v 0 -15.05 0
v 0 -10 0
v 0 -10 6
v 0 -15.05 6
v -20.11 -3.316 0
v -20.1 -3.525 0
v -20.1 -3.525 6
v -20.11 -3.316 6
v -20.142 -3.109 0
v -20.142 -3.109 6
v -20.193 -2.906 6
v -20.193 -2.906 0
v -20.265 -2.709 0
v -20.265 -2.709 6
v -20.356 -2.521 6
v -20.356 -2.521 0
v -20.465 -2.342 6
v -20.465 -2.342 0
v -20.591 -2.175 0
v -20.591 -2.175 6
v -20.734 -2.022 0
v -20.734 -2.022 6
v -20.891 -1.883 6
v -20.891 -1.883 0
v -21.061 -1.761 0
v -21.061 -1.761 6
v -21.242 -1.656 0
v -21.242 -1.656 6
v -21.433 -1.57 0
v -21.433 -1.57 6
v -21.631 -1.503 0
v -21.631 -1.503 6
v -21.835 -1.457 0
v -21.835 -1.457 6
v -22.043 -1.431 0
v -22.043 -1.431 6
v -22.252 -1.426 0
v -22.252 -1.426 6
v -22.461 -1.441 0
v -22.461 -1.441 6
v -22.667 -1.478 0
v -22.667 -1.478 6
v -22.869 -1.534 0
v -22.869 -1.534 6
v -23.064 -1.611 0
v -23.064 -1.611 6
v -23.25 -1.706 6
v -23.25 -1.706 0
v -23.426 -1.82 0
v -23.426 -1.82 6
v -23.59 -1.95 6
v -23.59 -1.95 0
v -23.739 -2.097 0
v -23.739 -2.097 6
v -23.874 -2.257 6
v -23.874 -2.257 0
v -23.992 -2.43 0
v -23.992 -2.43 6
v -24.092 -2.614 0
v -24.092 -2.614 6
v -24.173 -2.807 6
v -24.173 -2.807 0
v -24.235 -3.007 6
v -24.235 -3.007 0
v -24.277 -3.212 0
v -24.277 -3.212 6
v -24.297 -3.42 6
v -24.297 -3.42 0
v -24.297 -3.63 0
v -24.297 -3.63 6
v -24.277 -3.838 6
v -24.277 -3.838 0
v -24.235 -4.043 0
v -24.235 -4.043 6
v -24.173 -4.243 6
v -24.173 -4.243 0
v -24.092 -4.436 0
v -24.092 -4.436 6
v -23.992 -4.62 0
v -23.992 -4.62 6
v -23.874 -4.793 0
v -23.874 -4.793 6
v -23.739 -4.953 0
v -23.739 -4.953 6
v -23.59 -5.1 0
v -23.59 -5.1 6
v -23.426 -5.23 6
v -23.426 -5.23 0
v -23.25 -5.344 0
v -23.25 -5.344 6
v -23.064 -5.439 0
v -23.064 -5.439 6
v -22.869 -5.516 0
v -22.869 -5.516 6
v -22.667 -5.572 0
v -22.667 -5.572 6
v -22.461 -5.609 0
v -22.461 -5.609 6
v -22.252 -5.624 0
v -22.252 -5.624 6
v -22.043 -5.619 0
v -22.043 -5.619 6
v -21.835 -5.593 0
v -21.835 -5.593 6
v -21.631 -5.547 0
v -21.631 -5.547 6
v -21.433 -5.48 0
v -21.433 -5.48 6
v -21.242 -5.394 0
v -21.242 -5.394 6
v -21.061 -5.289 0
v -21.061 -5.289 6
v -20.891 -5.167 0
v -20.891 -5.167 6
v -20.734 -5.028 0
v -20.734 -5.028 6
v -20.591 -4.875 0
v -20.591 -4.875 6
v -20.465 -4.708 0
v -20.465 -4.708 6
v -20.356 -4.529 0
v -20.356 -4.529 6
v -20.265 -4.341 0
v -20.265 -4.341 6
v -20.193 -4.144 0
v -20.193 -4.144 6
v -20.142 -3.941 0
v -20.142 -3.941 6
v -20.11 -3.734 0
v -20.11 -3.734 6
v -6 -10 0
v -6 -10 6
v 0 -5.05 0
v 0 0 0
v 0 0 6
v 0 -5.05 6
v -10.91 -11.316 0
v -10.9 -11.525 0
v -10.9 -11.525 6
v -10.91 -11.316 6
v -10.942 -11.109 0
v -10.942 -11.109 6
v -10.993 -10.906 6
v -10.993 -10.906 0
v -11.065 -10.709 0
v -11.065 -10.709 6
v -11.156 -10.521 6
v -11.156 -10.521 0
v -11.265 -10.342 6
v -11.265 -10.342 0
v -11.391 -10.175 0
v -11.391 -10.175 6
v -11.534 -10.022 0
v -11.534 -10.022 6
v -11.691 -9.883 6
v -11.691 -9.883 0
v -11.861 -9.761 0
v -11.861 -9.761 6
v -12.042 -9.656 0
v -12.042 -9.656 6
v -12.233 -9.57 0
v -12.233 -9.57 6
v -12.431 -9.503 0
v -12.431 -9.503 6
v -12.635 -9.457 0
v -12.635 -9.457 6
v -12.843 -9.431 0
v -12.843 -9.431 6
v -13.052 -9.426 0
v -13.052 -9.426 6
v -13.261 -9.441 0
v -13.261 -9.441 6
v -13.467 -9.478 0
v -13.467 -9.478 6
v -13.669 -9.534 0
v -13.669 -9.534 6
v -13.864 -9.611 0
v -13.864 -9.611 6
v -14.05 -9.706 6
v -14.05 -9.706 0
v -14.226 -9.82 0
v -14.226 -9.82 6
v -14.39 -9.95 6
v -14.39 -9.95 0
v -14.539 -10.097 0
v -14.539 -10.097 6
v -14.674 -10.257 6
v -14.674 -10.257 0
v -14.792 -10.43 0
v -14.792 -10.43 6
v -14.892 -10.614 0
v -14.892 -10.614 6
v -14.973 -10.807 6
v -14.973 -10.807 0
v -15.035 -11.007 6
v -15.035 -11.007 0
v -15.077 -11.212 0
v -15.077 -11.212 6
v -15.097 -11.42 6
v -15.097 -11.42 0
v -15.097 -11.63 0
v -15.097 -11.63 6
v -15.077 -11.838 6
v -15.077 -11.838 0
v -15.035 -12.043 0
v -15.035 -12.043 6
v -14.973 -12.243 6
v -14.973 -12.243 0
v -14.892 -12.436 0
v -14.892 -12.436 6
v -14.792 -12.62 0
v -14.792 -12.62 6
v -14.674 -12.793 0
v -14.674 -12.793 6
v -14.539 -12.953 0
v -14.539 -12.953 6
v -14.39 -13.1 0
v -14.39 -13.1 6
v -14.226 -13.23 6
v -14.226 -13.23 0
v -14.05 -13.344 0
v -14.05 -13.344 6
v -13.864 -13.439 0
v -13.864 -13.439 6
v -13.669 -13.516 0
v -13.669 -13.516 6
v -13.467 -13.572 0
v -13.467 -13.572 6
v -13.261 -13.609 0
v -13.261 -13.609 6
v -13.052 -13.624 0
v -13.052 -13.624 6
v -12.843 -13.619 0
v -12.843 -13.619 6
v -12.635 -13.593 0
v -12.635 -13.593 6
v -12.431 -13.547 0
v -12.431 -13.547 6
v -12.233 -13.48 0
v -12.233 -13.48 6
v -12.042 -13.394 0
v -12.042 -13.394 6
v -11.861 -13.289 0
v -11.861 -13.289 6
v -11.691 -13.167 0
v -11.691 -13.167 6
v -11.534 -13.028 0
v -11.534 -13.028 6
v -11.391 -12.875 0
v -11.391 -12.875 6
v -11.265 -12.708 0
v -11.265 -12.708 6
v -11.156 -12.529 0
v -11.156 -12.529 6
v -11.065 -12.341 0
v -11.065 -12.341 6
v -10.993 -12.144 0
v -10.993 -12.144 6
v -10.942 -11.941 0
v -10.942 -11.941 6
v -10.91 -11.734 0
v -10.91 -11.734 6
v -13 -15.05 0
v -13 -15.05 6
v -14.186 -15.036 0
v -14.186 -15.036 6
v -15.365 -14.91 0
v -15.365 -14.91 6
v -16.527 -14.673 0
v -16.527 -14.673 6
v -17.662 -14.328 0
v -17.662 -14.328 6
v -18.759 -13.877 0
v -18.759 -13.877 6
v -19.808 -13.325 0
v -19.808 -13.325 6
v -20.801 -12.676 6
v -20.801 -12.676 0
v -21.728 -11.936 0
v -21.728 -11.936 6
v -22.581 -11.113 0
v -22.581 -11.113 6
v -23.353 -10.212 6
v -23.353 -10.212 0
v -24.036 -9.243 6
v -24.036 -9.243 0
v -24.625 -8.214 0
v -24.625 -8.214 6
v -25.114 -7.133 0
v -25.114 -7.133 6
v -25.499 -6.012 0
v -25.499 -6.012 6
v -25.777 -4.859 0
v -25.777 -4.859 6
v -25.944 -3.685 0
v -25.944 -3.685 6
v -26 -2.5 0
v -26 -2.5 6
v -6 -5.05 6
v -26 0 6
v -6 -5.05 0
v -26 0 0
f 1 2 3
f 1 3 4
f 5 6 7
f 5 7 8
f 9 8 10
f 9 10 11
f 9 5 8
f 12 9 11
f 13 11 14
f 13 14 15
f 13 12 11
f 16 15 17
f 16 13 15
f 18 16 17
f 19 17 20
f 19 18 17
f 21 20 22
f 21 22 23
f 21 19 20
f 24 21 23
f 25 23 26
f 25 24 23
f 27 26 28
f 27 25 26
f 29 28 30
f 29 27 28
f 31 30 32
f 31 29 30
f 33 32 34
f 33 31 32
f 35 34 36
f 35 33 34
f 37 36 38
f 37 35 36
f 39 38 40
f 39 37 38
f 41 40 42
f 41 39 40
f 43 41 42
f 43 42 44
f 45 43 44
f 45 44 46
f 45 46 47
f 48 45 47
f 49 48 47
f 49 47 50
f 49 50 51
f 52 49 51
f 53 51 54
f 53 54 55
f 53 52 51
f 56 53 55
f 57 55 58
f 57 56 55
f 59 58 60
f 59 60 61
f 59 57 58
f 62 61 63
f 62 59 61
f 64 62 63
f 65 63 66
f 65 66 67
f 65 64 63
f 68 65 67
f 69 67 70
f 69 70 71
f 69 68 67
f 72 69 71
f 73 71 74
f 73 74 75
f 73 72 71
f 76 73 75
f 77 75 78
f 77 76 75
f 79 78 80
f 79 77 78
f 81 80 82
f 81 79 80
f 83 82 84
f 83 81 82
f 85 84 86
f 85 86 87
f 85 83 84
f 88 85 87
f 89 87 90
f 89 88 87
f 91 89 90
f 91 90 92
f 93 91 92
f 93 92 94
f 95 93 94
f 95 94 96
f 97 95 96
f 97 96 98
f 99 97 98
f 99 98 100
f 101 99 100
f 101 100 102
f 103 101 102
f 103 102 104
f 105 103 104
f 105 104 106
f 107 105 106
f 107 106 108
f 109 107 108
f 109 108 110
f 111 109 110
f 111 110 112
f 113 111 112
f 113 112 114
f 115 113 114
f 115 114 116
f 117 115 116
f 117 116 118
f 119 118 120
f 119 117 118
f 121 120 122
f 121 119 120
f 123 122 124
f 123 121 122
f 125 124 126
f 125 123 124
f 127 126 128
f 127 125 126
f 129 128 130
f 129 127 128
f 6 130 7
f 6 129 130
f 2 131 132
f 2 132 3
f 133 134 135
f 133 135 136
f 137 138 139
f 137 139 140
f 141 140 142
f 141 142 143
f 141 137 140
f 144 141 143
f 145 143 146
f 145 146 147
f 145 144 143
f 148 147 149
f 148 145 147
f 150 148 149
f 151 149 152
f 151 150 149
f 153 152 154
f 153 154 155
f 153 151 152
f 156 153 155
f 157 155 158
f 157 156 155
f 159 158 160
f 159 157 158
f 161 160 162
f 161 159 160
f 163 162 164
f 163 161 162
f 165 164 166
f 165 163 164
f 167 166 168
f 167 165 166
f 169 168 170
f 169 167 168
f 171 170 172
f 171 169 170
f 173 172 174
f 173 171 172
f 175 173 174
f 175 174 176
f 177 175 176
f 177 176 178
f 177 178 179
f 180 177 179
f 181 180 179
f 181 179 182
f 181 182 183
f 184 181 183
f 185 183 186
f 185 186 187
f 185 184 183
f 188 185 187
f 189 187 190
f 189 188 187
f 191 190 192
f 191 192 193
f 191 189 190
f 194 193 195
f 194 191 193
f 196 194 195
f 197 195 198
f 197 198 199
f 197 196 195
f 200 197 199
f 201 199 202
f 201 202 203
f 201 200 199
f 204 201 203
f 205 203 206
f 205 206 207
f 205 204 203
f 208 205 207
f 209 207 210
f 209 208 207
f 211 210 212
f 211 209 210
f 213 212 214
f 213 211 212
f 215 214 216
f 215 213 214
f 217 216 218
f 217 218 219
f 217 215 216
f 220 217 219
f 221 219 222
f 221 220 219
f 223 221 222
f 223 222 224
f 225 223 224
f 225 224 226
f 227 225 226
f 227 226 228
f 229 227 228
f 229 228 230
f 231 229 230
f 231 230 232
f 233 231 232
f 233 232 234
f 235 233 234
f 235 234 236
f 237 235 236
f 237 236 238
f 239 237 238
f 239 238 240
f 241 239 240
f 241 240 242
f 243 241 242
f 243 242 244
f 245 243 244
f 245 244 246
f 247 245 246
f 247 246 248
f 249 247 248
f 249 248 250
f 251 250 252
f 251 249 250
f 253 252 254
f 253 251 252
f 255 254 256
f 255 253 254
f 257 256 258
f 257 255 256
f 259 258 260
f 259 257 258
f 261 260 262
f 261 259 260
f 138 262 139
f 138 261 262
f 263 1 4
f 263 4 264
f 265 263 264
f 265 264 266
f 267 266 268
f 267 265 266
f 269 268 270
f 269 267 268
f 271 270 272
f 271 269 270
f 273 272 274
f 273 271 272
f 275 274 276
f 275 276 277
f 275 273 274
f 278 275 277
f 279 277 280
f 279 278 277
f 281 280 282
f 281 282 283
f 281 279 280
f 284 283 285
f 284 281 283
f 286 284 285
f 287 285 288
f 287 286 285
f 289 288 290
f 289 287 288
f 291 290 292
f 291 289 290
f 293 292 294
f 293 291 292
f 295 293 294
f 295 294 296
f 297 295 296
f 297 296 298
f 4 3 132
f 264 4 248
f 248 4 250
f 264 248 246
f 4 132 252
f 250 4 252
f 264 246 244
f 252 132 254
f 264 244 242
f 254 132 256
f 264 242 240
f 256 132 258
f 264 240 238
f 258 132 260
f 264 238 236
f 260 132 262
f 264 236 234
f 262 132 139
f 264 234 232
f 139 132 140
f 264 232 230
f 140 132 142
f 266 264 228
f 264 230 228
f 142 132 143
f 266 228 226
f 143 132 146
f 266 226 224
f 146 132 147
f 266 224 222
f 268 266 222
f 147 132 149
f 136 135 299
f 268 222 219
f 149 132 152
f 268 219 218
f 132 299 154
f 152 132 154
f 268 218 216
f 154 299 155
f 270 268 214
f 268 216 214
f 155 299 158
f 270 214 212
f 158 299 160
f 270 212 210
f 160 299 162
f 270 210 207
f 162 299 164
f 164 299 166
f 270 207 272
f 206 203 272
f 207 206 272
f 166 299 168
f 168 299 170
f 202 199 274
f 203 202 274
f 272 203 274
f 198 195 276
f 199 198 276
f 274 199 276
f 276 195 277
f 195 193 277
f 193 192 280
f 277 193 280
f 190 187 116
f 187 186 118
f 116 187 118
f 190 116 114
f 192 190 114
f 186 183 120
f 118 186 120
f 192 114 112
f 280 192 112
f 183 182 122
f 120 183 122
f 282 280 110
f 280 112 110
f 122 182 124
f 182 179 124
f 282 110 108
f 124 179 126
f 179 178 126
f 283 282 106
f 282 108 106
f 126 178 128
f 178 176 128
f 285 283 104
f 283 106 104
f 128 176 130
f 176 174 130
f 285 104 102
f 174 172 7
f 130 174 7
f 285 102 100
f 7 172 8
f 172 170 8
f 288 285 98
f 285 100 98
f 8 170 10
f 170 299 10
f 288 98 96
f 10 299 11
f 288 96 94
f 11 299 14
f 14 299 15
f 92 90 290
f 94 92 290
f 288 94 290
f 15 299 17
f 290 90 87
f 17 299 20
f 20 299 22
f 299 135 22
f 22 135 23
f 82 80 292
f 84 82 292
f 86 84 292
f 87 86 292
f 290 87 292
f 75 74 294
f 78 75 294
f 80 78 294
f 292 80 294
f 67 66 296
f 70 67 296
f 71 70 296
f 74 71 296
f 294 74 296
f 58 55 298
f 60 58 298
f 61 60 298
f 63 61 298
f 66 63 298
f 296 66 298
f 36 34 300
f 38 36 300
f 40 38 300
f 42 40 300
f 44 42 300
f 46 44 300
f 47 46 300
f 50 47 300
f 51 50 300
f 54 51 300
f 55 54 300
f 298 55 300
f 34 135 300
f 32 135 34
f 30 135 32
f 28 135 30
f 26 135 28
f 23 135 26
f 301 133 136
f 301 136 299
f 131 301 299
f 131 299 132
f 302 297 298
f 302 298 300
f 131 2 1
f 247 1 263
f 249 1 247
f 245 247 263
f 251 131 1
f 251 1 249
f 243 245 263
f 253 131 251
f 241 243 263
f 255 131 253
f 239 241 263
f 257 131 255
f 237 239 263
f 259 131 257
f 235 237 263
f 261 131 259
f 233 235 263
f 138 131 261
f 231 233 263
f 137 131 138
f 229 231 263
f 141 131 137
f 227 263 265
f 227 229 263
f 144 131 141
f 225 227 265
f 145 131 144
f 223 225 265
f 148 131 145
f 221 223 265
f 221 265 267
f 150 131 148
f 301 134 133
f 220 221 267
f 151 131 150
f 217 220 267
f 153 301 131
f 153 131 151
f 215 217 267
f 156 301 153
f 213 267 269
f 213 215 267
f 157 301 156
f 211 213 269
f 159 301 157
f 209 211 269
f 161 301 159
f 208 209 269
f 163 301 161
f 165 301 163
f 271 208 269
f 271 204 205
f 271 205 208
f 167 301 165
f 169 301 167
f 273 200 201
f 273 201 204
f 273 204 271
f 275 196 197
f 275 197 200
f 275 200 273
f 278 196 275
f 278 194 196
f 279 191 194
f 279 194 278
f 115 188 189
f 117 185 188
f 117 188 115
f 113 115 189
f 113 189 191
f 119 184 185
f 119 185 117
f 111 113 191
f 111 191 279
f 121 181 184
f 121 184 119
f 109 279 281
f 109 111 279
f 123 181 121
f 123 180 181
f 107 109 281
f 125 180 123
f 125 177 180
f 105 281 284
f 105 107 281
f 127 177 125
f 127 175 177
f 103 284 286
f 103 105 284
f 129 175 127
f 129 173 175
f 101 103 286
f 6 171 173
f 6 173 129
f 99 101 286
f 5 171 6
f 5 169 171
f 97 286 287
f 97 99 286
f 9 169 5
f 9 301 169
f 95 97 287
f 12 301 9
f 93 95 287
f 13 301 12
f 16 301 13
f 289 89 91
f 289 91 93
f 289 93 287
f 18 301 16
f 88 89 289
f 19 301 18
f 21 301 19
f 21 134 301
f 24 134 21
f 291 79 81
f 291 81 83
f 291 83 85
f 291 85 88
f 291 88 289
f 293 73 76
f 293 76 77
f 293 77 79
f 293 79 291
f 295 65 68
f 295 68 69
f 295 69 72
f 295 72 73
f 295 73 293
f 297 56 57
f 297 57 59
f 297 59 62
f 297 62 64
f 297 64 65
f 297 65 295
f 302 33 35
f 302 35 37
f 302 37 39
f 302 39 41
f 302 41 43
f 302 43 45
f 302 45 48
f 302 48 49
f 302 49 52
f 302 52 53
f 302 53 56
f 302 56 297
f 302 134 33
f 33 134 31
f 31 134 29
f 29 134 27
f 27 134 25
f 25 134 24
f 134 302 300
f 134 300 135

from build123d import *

# Parameters (mm, degrees)
ESQUISSE1_R        = 2.1
BOSS_EXTRU_1_DEPTH = 6


with BuildPart() as part:
    # Esquisse1 → Boss.-Extru.1 (new body)
    with BuildSketch(Plane.XY):
        with BuildLine():
            Line((0, 0), (0, -5.05))
            Line((0, -5.05), (-6, -5.05))
            Line((-6, -5.05), (-6, -10))
            Line((-6, -10), (0, -10))
            Line((0, -10), (0, -15.05))
            Line((0, -15.05), (-13, -15.05))
            ThreePointArc((-13, -15.05), (-22.164162355, -11.534690089), (-26, -2.5))
            Line((-26, -2.5), (-26, 0))
            Line((-26, 0), (0, 0))
        make_face()
        with Locations((-22.2, -3.525)):
            Circle(ESQUISSE1_R, mode=Mode.SUBTRACT)
        with Locations((-13, -11.525)):
            Circle(ESQUISSE1_R, mode=Mode.SUBTRACT)
    extrude(amount=BOSS_EXTRU_1_DEPTH)


solid = part.part
